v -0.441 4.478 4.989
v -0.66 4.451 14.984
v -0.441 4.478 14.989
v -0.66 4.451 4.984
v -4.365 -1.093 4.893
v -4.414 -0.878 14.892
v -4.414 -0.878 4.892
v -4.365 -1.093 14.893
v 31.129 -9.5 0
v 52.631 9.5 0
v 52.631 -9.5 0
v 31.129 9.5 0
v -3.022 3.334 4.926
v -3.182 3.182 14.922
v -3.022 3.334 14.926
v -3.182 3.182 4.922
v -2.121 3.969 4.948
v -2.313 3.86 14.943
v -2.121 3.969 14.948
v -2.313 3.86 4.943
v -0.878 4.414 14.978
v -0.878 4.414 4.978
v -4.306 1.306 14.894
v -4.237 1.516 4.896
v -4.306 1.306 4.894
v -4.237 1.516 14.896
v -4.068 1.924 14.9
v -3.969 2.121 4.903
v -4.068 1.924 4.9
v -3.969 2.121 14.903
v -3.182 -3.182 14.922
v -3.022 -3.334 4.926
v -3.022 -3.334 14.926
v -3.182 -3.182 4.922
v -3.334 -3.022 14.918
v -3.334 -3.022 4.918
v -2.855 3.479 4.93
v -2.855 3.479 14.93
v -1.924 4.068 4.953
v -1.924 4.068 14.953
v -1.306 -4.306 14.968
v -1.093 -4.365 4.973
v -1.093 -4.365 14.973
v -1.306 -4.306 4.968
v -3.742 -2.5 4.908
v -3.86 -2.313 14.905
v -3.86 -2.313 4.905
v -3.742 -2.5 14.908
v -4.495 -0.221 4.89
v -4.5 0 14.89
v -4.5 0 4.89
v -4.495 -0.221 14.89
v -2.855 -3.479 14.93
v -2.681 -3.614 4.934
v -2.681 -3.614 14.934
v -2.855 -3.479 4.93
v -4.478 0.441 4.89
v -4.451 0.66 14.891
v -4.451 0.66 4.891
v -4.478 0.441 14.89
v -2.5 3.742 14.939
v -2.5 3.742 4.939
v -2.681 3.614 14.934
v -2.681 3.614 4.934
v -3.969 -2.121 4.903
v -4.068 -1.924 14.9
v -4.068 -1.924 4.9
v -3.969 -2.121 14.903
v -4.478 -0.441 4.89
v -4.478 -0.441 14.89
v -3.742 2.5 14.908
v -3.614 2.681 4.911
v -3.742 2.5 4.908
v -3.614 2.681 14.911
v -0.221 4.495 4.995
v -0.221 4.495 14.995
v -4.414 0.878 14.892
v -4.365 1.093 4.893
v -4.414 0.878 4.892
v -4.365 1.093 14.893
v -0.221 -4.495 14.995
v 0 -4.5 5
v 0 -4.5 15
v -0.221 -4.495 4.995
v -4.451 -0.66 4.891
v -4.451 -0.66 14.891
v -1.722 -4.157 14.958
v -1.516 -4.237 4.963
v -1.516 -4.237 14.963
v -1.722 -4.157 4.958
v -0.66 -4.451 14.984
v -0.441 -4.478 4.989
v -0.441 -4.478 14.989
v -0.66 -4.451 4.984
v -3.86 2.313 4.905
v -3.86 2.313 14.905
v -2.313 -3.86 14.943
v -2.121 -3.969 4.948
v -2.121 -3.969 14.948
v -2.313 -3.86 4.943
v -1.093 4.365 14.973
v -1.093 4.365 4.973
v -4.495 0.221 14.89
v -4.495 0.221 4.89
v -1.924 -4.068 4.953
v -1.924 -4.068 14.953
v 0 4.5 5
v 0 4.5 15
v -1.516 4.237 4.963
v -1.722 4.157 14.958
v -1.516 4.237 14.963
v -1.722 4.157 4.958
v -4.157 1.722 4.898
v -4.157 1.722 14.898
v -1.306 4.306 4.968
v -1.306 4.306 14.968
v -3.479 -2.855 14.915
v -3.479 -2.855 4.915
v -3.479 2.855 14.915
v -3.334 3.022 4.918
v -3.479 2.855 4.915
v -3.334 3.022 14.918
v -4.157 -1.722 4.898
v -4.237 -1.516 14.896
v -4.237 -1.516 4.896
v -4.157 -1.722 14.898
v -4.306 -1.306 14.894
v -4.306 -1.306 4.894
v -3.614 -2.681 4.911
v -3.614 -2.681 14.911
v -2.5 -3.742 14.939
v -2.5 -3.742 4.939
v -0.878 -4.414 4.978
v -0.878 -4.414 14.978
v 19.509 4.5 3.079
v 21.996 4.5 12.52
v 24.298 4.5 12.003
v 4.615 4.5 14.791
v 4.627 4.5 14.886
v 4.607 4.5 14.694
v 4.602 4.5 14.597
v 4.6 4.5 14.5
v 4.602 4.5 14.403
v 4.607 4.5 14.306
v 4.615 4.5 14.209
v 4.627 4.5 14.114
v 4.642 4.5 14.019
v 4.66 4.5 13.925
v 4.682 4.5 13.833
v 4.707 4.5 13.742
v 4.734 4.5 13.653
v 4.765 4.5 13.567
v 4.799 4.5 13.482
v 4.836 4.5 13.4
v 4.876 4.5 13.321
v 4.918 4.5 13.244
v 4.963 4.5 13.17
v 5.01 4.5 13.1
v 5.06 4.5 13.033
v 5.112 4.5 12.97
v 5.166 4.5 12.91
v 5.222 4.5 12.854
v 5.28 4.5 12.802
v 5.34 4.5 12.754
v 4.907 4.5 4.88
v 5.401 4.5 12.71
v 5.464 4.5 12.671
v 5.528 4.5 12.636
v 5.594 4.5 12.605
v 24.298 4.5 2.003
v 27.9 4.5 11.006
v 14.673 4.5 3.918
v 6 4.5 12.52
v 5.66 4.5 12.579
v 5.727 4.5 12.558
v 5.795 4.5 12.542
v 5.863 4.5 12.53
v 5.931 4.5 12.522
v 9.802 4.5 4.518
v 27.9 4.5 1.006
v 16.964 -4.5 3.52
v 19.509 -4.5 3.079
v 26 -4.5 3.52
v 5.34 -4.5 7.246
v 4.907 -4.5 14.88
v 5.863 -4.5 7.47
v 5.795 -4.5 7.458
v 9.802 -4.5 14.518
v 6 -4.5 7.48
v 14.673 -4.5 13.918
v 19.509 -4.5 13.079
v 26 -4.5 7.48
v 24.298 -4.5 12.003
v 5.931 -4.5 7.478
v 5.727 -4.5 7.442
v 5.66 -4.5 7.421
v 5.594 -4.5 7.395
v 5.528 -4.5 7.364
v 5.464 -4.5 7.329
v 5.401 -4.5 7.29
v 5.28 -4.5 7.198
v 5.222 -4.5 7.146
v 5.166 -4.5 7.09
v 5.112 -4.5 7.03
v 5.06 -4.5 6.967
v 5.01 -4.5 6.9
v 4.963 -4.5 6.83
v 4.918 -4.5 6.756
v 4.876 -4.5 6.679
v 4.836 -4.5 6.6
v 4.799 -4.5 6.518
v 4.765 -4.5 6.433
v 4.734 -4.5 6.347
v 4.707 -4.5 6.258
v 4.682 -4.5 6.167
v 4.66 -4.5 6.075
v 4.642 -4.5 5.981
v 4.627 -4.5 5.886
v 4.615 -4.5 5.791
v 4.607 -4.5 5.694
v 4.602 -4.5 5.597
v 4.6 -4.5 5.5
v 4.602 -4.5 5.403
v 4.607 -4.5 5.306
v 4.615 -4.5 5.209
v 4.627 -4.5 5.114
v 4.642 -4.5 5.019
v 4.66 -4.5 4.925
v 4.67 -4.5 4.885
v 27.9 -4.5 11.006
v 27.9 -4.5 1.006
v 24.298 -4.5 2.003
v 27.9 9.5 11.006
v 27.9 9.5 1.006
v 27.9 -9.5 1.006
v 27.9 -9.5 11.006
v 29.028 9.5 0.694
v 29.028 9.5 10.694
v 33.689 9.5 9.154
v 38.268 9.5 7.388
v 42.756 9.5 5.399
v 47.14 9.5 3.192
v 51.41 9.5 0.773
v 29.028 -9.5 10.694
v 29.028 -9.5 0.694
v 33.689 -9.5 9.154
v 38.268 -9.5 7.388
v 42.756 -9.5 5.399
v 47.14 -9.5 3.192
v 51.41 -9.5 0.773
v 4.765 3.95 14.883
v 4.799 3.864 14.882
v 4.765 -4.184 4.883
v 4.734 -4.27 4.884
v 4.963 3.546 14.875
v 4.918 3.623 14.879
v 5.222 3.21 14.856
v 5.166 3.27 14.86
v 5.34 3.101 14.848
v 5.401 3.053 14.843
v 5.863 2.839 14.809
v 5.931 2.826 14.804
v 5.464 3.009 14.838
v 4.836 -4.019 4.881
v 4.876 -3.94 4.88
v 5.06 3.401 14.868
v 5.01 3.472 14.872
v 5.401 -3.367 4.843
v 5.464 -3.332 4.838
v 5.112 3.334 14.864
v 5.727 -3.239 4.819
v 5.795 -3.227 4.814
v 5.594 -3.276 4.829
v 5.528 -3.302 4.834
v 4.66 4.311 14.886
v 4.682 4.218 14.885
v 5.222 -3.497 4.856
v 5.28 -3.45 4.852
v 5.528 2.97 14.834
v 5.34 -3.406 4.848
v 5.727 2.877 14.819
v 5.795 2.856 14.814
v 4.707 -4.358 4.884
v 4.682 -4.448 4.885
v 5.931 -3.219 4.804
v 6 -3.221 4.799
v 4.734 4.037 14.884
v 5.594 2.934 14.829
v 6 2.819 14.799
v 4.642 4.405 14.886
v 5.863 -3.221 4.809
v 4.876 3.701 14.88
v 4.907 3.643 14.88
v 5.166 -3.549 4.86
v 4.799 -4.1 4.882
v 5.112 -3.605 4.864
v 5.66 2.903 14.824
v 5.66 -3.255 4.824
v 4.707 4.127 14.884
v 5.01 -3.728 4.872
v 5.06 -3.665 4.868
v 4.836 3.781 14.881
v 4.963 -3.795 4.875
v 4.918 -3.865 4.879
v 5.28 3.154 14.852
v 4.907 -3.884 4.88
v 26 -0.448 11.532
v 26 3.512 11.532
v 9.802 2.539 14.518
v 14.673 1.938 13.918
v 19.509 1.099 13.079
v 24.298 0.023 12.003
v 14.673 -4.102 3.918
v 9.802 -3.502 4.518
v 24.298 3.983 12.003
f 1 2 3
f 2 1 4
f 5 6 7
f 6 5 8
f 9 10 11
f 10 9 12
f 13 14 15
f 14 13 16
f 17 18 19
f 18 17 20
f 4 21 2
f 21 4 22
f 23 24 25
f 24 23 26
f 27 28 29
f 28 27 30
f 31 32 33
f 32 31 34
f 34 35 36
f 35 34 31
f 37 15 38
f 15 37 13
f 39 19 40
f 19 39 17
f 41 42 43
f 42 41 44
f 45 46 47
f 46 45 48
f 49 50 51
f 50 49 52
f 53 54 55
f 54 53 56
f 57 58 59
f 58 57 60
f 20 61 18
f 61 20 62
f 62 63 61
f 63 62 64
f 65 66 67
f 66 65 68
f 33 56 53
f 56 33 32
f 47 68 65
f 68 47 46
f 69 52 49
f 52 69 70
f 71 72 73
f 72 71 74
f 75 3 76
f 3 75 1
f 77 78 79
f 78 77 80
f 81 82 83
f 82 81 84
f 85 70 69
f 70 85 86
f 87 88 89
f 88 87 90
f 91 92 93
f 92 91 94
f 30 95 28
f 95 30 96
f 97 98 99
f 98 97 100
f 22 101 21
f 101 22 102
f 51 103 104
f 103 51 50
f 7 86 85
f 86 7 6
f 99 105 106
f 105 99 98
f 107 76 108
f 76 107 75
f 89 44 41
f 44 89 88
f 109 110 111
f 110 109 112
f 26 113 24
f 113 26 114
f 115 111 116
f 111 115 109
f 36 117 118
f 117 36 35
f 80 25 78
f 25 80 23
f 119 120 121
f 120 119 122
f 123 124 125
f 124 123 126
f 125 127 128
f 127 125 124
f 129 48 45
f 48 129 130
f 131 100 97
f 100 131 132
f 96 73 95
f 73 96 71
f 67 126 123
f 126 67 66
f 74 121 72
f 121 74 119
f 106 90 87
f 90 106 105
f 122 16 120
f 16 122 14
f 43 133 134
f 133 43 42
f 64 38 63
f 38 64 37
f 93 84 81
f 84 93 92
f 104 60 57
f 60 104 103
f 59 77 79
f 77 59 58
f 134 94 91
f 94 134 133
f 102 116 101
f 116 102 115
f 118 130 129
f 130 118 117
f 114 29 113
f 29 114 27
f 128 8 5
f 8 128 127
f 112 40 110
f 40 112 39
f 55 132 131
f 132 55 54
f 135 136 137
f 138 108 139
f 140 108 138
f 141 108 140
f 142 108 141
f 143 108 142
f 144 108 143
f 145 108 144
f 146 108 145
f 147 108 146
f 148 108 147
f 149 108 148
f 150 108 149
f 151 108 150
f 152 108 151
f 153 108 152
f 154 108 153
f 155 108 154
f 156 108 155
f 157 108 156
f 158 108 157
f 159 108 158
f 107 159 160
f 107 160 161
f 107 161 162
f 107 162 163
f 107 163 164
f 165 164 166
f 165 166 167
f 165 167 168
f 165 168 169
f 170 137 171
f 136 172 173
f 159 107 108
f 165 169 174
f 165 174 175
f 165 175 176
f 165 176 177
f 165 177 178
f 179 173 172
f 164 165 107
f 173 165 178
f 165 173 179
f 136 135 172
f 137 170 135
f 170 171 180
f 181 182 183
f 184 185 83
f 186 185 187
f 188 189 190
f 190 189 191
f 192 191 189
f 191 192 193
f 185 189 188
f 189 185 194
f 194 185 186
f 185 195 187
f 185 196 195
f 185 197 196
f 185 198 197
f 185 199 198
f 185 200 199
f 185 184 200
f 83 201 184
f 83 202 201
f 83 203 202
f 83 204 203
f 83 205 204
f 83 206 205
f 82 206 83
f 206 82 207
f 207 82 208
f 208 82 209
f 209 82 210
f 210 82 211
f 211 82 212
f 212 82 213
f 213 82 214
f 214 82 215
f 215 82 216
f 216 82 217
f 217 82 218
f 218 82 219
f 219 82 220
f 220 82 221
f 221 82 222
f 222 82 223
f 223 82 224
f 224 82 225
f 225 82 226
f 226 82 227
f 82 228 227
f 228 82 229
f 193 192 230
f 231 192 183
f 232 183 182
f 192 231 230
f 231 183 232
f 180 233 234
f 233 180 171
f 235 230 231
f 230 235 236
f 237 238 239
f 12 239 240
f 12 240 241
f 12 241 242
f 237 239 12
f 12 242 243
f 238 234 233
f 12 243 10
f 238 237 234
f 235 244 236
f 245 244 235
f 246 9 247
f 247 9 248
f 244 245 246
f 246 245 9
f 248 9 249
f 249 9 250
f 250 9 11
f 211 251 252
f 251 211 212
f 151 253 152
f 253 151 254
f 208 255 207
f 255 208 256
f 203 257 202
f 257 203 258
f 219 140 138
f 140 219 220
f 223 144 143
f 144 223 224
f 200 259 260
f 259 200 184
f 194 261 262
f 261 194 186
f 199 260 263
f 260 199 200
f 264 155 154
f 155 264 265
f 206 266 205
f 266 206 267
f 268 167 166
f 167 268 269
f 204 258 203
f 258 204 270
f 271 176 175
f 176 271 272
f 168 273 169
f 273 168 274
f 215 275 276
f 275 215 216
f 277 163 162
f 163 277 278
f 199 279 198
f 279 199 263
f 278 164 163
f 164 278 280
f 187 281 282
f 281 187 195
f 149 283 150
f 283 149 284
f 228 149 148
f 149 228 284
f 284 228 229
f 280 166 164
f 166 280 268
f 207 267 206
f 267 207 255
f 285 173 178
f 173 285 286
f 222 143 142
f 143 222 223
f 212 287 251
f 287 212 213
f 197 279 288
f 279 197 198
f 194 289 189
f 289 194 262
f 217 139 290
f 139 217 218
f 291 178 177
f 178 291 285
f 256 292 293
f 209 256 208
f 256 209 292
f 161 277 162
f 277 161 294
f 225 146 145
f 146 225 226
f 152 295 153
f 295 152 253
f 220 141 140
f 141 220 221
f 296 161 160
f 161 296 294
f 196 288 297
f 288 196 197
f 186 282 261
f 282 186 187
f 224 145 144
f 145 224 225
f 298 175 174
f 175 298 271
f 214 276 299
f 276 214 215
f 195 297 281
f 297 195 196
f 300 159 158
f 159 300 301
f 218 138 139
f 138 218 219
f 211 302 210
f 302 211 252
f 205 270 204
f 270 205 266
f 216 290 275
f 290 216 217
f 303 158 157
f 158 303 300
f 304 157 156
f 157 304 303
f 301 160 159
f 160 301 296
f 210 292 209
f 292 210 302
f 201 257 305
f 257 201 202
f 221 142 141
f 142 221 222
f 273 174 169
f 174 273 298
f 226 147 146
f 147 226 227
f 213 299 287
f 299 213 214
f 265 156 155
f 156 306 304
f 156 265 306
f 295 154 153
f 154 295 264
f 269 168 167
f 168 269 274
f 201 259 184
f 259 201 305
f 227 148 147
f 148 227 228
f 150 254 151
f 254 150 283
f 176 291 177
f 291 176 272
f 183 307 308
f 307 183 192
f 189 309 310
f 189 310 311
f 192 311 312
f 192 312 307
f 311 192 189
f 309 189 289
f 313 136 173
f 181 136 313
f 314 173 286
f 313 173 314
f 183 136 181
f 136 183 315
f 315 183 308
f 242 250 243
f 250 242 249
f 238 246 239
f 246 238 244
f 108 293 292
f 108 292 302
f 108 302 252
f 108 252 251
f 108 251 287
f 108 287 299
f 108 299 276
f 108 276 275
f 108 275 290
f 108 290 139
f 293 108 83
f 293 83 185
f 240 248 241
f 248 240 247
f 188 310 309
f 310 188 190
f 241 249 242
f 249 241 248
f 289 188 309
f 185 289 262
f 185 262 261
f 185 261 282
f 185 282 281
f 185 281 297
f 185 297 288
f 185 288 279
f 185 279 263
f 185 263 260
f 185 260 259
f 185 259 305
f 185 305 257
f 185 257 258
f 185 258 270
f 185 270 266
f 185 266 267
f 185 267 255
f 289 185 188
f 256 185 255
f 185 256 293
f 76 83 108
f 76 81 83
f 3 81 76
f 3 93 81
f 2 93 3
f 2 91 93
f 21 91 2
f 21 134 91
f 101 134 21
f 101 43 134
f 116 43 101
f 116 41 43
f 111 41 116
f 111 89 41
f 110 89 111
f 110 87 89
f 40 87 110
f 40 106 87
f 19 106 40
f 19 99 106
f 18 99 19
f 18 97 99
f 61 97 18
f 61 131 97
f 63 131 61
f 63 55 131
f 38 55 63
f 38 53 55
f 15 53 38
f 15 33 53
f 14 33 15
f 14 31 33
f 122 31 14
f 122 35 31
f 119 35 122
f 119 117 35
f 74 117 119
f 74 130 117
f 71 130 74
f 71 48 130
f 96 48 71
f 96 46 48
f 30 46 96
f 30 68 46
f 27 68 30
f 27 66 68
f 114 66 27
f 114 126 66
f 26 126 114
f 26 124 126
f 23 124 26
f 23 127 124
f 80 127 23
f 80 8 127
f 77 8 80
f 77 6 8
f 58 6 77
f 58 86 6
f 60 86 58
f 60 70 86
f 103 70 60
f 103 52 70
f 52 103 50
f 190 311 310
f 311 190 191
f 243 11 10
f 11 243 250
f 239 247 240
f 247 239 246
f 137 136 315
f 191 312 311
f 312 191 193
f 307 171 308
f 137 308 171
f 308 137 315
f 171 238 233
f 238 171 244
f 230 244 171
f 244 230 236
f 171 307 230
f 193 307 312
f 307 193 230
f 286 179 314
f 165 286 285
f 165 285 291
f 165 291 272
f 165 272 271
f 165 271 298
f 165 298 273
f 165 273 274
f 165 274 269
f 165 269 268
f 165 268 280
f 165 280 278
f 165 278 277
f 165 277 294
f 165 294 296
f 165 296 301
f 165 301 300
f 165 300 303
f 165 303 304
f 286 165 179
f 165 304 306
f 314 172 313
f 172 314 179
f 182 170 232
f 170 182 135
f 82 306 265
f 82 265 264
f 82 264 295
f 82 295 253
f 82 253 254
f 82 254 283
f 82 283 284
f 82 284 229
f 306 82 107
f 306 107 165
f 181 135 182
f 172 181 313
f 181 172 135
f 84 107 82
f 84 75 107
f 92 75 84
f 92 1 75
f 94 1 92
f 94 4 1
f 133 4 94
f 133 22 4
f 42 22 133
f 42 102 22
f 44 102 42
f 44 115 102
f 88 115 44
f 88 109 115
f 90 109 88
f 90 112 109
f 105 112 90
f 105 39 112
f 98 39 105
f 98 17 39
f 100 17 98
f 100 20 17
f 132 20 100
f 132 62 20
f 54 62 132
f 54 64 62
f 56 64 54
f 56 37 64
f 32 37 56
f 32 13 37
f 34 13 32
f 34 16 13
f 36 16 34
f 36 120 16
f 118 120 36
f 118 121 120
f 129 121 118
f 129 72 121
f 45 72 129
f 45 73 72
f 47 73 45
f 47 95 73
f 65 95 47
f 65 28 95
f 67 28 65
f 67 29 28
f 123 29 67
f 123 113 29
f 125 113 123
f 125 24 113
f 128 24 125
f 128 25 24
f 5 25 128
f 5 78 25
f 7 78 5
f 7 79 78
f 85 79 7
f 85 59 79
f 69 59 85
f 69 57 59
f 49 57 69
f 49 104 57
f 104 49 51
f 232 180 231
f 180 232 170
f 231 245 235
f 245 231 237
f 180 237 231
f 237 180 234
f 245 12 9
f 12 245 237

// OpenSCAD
$fn=128;
module buckle(){
    intersection()
    {
        union() {
            cylinder(r=4.5, h=20);
            translate([0,-4.5,0])
                cube([28,9,20]);
            translate([27.9,-9.5,0])
                cube([28,19,20]);
        }
        
        translate([0,0,-85])
        rotate([90,0,0])
        difference(){
            cylinder(r=100, h=40, center=true);
            translate([0,-10,0])            
                cylinder(r=100, h=41, center=true);
            translate([6,95,0])
            rotate([45,0,0]){
                cylinder(r=1.4, h=41, center=true);
                translate([10,0,0])
                    cube([20,2.8,41],center=true);
            }
            
        }
    }
}


buckle();
